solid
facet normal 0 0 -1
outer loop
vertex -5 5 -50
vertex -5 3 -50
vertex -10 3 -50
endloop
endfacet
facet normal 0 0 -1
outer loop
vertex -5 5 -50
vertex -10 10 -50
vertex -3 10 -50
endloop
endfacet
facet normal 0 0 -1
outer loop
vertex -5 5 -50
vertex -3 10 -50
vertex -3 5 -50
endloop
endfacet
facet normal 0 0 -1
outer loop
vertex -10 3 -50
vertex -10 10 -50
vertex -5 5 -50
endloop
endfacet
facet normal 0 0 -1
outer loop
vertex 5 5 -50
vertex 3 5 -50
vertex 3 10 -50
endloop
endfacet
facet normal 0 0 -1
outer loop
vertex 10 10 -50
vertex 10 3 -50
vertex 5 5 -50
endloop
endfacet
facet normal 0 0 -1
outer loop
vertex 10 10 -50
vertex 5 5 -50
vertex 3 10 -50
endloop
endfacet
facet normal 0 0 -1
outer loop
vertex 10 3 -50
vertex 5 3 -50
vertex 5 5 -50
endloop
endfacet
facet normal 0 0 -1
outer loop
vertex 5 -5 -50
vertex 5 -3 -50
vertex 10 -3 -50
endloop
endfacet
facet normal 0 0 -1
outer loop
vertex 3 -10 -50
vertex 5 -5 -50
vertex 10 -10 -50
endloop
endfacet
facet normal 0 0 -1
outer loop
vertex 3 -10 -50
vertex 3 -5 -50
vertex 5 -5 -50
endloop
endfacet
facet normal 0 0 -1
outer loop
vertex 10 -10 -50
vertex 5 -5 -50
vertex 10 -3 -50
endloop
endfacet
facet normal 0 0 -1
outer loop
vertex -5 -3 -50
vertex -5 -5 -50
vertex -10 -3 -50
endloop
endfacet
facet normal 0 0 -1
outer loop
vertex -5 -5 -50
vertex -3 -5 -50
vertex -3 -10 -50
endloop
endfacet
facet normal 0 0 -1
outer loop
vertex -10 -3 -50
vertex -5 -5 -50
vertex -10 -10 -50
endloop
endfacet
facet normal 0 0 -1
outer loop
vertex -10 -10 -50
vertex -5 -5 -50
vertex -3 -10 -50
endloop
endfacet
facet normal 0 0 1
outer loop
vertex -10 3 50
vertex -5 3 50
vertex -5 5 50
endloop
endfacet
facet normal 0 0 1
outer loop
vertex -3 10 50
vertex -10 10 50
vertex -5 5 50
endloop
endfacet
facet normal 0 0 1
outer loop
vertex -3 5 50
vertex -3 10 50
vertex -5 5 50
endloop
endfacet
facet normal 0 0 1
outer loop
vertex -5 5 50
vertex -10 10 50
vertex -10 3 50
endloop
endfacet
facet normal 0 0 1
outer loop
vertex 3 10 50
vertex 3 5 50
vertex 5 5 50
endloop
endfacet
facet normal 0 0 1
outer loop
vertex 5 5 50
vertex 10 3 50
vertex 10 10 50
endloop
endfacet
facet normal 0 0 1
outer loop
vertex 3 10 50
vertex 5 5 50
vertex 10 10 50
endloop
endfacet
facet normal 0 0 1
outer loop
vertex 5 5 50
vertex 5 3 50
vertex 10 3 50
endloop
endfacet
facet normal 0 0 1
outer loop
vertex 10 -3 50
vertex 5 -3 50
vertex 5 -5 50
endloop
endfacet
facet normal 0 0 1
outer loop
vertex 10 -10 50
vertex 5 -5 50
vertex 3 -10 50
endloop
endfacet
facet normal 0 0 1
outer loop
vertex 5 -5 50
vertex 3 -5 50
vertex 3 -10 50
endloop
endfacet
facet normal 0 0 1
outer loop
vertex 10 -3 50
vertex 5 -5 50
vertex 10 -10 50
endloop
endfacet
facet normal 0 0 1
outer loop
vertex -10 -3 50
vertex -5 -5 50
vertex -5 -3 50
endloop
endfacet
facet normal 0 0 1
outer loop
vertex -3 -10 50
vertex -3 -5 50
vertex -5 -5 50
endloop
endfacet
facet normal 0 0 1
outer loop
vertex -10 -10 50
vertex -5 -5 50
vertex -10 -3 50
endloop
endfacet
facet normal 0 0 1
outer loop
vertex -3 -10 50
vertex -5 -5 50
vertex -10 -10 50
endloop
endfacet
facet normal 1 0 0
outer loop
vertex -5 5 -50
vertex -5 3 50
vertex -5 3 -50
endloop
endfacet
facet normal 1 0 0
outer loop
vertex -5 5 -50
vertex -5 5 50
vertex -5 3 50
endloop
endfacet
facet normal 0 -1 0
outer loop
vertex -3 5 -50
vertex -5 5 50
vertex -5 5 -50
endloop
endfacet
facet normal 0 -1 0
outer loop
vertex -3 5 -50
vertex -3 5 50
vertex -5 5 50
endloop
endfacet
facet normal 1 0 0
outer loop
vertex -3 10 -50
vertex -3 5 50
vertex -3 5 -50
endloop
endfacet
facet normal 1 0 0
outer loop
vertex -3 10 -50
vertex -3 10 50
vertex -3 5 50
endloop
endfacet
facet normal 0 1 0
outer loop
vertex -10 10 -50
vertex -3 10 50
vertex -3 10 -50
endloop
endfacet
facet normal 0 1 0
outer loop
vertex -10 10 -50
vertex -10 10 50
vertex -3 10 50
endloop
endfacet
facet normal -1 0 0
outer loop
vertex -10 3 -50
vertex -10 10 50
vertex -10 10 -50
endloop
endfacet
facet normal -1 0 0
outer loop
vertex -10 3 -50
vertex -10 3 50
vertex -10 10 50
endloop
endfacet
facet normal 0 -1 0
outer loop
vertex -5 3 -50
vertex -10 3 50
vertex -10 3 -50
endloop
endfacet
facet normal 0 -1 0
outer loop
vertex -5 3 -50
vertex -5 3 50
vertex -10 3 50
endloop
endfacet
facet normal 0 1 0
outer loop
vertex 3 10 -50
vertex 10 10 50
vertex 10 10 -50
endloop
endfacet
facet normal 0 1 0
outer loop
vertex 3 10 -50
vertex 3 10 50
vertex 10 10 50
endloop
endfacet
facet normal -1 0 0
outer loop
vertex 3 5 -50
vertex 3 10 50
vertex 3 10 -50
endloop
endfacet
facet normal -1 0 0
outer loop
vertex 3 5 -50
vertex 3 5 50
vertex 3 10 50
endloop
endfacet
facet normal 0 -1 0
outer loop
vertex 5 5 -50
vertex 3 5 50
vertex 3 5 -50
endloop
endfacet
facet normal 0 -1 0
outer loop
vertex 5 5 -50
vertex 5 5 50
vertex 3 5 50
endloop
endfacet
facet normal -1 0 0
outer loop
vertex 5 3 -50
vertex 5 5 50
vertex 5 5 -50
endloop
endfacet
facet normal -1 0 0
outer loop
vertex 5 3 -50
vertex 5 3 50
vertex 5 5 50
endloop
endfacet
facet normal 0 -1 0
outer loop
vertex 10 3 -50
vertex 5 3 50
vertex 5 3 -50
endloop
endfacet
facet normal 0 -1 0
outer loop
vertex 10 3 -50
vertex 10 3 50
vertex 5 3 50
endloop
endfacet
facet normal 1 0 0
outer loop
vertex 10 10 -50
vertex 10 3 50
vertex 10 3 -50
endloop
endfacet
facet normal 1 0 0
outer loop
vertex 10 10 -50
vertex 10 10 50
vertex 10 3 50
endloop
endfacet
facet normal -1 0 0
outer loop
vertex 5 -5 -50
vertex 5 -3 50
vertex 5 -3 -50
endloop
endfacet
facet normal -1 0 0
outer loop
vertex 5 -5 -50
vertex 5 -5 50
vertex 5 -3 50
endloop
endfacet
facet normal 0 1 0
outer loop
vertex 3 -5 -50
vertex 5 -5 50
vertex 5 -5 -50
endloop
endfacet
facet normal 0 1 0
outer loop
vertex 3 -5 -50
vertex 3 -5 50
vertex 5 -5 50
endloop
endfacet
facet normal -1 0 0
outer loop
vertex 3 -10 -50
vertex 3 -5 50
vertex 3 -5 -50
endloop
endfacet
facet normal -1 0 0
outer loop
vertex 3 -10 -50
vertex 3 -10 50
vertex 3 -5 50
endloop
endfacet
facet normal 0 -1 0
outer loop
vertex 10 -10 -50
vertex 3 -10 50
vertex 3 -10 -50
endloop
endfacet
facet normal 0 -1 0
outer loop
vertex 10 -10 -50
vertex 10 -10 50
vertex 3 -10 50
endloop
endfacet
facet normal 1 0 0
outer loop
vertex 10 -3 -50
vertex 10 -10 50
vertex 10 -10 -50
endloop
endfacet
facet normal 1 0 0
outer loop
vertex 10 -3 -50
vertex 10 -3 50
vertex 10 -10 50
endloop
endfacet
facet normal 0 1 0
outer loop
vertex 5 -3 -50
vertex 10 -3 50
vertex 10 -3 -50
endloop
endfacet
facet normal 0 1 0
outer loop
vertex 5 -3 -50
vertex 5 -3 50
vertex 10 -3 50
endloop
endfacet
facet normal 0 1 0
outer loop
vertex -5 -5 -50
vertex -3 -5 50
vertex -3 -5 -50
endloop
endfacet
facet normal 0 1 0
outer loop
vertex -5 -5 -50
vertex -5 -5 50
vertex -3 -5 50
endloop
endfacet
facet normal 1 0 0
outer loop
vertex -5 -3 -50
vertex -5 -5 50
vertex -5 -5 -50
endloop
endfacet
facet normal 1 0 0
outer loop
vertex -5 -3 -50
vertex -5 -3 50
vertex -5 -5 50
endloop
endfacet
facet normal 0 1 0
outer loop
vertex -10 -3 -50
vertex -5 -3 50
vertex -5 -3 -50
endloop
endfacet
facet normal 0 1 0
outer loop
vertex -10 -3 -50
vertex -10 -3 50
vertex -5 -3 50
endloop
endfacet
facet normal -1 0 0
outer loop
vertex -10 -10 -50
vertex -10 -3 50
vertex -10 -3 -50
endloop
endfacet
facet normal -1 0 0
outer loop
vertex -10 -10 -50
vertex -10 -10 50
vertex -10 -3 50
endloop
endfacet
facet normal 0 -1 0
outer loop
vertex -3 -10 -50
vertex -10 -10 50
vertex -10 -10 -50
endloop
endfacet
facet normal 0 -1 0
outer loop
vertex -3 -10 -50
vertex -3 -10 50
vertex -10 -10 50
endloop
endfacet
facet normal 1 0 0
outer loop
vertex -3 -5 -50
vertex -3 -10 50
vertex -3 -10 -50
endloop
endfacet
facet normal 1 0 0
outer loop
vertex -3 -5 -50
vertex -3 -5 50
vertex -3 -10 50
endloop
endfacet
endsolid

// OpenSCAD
// 20x20 T-slot aluminium extrusion (approx. 2020 profile), 100mm long
// STRUCTURAL FIX: ensure the cross-section is ONE connected solid (no split/floating long bodies)

$fn = 96;

// Parameters (mm)
size_mm   = 20.0;
length_mm = 100.0;

// Proportions (simple but recognizable)
slot_open_mm     = 6.0;   // opening width at the face
slot_depth_mm    = 6.0;   // depth from face inward
slot_cavity_w_mm = 10.0;  // wider cavity behind opening
slot_cavity_d_mm = 3.0;   // cavity depth behind opening
center_bore_d_mm = 5.0;   // center hole diameter

// Overlap to guarantee boolean connectivity (1-2mm as requested)
overlap_mm = 1.0;

// Minimum web thickness that MUST remain between opposite slot cuts
// to prevent the profile from splitting into two long bars / four corner blocks.
min_web_mm = 2.0;

// Derived: clamp slot depth so opposite cuts cannot sever the body.
// Condition: 2*slot_depth <= size - min_web
slot_depth_eff_mm = min(slot_depth_mm, (size_mm - min_web_mm)/2);

// Also clamp cavity depth so it stays behind the opening and doesn't worsen severing.
slot_cavity_d_eff_mm = min(slot_cavity_d_mm, max(0, slot_depth_eff_mm - 1.0));

module tslot2020_section_2d() {
    difference() {
        // Main body (solid 20x20)
        square([size_mm, size_mm], center=true);

        // Center bore (hole)
        circle(d=center_bore_d_mm);

        // Four T-slots cut from each face inward
        for (a = [0, 90, 180, 270]) {
            rotate(a) {
                // Slot opening (narrow) from face inward
                // Positioned so its outer edge slightly protrudes past the face (overlap),
                // but its inner edge stops at (size/2 - slot_depth_eff), preserving a center web.
                translate([ size_mm/2 - slot_depth_eff_mm/2 + overlap_mm/2, 0 ])
                    square([ slot_depth_eff_mm + overlap_mm, slot_open_mm ], center=true);

                // Slot cavity (wider) behind the opening (still not allowed to reach center)
                translate([ size_mm/2 - slot_depth_eff_mm - slot_cavity_d_eff_mm/2 + overlap_mm/2, 0 ])
                    square([ slot_cavity_d_eff_mm + overlap_mm, slot_cavity_w_mm ], center=true);
            }
        }
    }
}

module extrusion_2020(len=length_mm) {
    // Union used explicitly to ensure a single combined solid
    union() {
        color("Silver")
            linear_extrude(height=len, center=true, convexity=10)
                tslot2020_section_2d();
    }
}

// Build
extrusion_2020(length_mm);
